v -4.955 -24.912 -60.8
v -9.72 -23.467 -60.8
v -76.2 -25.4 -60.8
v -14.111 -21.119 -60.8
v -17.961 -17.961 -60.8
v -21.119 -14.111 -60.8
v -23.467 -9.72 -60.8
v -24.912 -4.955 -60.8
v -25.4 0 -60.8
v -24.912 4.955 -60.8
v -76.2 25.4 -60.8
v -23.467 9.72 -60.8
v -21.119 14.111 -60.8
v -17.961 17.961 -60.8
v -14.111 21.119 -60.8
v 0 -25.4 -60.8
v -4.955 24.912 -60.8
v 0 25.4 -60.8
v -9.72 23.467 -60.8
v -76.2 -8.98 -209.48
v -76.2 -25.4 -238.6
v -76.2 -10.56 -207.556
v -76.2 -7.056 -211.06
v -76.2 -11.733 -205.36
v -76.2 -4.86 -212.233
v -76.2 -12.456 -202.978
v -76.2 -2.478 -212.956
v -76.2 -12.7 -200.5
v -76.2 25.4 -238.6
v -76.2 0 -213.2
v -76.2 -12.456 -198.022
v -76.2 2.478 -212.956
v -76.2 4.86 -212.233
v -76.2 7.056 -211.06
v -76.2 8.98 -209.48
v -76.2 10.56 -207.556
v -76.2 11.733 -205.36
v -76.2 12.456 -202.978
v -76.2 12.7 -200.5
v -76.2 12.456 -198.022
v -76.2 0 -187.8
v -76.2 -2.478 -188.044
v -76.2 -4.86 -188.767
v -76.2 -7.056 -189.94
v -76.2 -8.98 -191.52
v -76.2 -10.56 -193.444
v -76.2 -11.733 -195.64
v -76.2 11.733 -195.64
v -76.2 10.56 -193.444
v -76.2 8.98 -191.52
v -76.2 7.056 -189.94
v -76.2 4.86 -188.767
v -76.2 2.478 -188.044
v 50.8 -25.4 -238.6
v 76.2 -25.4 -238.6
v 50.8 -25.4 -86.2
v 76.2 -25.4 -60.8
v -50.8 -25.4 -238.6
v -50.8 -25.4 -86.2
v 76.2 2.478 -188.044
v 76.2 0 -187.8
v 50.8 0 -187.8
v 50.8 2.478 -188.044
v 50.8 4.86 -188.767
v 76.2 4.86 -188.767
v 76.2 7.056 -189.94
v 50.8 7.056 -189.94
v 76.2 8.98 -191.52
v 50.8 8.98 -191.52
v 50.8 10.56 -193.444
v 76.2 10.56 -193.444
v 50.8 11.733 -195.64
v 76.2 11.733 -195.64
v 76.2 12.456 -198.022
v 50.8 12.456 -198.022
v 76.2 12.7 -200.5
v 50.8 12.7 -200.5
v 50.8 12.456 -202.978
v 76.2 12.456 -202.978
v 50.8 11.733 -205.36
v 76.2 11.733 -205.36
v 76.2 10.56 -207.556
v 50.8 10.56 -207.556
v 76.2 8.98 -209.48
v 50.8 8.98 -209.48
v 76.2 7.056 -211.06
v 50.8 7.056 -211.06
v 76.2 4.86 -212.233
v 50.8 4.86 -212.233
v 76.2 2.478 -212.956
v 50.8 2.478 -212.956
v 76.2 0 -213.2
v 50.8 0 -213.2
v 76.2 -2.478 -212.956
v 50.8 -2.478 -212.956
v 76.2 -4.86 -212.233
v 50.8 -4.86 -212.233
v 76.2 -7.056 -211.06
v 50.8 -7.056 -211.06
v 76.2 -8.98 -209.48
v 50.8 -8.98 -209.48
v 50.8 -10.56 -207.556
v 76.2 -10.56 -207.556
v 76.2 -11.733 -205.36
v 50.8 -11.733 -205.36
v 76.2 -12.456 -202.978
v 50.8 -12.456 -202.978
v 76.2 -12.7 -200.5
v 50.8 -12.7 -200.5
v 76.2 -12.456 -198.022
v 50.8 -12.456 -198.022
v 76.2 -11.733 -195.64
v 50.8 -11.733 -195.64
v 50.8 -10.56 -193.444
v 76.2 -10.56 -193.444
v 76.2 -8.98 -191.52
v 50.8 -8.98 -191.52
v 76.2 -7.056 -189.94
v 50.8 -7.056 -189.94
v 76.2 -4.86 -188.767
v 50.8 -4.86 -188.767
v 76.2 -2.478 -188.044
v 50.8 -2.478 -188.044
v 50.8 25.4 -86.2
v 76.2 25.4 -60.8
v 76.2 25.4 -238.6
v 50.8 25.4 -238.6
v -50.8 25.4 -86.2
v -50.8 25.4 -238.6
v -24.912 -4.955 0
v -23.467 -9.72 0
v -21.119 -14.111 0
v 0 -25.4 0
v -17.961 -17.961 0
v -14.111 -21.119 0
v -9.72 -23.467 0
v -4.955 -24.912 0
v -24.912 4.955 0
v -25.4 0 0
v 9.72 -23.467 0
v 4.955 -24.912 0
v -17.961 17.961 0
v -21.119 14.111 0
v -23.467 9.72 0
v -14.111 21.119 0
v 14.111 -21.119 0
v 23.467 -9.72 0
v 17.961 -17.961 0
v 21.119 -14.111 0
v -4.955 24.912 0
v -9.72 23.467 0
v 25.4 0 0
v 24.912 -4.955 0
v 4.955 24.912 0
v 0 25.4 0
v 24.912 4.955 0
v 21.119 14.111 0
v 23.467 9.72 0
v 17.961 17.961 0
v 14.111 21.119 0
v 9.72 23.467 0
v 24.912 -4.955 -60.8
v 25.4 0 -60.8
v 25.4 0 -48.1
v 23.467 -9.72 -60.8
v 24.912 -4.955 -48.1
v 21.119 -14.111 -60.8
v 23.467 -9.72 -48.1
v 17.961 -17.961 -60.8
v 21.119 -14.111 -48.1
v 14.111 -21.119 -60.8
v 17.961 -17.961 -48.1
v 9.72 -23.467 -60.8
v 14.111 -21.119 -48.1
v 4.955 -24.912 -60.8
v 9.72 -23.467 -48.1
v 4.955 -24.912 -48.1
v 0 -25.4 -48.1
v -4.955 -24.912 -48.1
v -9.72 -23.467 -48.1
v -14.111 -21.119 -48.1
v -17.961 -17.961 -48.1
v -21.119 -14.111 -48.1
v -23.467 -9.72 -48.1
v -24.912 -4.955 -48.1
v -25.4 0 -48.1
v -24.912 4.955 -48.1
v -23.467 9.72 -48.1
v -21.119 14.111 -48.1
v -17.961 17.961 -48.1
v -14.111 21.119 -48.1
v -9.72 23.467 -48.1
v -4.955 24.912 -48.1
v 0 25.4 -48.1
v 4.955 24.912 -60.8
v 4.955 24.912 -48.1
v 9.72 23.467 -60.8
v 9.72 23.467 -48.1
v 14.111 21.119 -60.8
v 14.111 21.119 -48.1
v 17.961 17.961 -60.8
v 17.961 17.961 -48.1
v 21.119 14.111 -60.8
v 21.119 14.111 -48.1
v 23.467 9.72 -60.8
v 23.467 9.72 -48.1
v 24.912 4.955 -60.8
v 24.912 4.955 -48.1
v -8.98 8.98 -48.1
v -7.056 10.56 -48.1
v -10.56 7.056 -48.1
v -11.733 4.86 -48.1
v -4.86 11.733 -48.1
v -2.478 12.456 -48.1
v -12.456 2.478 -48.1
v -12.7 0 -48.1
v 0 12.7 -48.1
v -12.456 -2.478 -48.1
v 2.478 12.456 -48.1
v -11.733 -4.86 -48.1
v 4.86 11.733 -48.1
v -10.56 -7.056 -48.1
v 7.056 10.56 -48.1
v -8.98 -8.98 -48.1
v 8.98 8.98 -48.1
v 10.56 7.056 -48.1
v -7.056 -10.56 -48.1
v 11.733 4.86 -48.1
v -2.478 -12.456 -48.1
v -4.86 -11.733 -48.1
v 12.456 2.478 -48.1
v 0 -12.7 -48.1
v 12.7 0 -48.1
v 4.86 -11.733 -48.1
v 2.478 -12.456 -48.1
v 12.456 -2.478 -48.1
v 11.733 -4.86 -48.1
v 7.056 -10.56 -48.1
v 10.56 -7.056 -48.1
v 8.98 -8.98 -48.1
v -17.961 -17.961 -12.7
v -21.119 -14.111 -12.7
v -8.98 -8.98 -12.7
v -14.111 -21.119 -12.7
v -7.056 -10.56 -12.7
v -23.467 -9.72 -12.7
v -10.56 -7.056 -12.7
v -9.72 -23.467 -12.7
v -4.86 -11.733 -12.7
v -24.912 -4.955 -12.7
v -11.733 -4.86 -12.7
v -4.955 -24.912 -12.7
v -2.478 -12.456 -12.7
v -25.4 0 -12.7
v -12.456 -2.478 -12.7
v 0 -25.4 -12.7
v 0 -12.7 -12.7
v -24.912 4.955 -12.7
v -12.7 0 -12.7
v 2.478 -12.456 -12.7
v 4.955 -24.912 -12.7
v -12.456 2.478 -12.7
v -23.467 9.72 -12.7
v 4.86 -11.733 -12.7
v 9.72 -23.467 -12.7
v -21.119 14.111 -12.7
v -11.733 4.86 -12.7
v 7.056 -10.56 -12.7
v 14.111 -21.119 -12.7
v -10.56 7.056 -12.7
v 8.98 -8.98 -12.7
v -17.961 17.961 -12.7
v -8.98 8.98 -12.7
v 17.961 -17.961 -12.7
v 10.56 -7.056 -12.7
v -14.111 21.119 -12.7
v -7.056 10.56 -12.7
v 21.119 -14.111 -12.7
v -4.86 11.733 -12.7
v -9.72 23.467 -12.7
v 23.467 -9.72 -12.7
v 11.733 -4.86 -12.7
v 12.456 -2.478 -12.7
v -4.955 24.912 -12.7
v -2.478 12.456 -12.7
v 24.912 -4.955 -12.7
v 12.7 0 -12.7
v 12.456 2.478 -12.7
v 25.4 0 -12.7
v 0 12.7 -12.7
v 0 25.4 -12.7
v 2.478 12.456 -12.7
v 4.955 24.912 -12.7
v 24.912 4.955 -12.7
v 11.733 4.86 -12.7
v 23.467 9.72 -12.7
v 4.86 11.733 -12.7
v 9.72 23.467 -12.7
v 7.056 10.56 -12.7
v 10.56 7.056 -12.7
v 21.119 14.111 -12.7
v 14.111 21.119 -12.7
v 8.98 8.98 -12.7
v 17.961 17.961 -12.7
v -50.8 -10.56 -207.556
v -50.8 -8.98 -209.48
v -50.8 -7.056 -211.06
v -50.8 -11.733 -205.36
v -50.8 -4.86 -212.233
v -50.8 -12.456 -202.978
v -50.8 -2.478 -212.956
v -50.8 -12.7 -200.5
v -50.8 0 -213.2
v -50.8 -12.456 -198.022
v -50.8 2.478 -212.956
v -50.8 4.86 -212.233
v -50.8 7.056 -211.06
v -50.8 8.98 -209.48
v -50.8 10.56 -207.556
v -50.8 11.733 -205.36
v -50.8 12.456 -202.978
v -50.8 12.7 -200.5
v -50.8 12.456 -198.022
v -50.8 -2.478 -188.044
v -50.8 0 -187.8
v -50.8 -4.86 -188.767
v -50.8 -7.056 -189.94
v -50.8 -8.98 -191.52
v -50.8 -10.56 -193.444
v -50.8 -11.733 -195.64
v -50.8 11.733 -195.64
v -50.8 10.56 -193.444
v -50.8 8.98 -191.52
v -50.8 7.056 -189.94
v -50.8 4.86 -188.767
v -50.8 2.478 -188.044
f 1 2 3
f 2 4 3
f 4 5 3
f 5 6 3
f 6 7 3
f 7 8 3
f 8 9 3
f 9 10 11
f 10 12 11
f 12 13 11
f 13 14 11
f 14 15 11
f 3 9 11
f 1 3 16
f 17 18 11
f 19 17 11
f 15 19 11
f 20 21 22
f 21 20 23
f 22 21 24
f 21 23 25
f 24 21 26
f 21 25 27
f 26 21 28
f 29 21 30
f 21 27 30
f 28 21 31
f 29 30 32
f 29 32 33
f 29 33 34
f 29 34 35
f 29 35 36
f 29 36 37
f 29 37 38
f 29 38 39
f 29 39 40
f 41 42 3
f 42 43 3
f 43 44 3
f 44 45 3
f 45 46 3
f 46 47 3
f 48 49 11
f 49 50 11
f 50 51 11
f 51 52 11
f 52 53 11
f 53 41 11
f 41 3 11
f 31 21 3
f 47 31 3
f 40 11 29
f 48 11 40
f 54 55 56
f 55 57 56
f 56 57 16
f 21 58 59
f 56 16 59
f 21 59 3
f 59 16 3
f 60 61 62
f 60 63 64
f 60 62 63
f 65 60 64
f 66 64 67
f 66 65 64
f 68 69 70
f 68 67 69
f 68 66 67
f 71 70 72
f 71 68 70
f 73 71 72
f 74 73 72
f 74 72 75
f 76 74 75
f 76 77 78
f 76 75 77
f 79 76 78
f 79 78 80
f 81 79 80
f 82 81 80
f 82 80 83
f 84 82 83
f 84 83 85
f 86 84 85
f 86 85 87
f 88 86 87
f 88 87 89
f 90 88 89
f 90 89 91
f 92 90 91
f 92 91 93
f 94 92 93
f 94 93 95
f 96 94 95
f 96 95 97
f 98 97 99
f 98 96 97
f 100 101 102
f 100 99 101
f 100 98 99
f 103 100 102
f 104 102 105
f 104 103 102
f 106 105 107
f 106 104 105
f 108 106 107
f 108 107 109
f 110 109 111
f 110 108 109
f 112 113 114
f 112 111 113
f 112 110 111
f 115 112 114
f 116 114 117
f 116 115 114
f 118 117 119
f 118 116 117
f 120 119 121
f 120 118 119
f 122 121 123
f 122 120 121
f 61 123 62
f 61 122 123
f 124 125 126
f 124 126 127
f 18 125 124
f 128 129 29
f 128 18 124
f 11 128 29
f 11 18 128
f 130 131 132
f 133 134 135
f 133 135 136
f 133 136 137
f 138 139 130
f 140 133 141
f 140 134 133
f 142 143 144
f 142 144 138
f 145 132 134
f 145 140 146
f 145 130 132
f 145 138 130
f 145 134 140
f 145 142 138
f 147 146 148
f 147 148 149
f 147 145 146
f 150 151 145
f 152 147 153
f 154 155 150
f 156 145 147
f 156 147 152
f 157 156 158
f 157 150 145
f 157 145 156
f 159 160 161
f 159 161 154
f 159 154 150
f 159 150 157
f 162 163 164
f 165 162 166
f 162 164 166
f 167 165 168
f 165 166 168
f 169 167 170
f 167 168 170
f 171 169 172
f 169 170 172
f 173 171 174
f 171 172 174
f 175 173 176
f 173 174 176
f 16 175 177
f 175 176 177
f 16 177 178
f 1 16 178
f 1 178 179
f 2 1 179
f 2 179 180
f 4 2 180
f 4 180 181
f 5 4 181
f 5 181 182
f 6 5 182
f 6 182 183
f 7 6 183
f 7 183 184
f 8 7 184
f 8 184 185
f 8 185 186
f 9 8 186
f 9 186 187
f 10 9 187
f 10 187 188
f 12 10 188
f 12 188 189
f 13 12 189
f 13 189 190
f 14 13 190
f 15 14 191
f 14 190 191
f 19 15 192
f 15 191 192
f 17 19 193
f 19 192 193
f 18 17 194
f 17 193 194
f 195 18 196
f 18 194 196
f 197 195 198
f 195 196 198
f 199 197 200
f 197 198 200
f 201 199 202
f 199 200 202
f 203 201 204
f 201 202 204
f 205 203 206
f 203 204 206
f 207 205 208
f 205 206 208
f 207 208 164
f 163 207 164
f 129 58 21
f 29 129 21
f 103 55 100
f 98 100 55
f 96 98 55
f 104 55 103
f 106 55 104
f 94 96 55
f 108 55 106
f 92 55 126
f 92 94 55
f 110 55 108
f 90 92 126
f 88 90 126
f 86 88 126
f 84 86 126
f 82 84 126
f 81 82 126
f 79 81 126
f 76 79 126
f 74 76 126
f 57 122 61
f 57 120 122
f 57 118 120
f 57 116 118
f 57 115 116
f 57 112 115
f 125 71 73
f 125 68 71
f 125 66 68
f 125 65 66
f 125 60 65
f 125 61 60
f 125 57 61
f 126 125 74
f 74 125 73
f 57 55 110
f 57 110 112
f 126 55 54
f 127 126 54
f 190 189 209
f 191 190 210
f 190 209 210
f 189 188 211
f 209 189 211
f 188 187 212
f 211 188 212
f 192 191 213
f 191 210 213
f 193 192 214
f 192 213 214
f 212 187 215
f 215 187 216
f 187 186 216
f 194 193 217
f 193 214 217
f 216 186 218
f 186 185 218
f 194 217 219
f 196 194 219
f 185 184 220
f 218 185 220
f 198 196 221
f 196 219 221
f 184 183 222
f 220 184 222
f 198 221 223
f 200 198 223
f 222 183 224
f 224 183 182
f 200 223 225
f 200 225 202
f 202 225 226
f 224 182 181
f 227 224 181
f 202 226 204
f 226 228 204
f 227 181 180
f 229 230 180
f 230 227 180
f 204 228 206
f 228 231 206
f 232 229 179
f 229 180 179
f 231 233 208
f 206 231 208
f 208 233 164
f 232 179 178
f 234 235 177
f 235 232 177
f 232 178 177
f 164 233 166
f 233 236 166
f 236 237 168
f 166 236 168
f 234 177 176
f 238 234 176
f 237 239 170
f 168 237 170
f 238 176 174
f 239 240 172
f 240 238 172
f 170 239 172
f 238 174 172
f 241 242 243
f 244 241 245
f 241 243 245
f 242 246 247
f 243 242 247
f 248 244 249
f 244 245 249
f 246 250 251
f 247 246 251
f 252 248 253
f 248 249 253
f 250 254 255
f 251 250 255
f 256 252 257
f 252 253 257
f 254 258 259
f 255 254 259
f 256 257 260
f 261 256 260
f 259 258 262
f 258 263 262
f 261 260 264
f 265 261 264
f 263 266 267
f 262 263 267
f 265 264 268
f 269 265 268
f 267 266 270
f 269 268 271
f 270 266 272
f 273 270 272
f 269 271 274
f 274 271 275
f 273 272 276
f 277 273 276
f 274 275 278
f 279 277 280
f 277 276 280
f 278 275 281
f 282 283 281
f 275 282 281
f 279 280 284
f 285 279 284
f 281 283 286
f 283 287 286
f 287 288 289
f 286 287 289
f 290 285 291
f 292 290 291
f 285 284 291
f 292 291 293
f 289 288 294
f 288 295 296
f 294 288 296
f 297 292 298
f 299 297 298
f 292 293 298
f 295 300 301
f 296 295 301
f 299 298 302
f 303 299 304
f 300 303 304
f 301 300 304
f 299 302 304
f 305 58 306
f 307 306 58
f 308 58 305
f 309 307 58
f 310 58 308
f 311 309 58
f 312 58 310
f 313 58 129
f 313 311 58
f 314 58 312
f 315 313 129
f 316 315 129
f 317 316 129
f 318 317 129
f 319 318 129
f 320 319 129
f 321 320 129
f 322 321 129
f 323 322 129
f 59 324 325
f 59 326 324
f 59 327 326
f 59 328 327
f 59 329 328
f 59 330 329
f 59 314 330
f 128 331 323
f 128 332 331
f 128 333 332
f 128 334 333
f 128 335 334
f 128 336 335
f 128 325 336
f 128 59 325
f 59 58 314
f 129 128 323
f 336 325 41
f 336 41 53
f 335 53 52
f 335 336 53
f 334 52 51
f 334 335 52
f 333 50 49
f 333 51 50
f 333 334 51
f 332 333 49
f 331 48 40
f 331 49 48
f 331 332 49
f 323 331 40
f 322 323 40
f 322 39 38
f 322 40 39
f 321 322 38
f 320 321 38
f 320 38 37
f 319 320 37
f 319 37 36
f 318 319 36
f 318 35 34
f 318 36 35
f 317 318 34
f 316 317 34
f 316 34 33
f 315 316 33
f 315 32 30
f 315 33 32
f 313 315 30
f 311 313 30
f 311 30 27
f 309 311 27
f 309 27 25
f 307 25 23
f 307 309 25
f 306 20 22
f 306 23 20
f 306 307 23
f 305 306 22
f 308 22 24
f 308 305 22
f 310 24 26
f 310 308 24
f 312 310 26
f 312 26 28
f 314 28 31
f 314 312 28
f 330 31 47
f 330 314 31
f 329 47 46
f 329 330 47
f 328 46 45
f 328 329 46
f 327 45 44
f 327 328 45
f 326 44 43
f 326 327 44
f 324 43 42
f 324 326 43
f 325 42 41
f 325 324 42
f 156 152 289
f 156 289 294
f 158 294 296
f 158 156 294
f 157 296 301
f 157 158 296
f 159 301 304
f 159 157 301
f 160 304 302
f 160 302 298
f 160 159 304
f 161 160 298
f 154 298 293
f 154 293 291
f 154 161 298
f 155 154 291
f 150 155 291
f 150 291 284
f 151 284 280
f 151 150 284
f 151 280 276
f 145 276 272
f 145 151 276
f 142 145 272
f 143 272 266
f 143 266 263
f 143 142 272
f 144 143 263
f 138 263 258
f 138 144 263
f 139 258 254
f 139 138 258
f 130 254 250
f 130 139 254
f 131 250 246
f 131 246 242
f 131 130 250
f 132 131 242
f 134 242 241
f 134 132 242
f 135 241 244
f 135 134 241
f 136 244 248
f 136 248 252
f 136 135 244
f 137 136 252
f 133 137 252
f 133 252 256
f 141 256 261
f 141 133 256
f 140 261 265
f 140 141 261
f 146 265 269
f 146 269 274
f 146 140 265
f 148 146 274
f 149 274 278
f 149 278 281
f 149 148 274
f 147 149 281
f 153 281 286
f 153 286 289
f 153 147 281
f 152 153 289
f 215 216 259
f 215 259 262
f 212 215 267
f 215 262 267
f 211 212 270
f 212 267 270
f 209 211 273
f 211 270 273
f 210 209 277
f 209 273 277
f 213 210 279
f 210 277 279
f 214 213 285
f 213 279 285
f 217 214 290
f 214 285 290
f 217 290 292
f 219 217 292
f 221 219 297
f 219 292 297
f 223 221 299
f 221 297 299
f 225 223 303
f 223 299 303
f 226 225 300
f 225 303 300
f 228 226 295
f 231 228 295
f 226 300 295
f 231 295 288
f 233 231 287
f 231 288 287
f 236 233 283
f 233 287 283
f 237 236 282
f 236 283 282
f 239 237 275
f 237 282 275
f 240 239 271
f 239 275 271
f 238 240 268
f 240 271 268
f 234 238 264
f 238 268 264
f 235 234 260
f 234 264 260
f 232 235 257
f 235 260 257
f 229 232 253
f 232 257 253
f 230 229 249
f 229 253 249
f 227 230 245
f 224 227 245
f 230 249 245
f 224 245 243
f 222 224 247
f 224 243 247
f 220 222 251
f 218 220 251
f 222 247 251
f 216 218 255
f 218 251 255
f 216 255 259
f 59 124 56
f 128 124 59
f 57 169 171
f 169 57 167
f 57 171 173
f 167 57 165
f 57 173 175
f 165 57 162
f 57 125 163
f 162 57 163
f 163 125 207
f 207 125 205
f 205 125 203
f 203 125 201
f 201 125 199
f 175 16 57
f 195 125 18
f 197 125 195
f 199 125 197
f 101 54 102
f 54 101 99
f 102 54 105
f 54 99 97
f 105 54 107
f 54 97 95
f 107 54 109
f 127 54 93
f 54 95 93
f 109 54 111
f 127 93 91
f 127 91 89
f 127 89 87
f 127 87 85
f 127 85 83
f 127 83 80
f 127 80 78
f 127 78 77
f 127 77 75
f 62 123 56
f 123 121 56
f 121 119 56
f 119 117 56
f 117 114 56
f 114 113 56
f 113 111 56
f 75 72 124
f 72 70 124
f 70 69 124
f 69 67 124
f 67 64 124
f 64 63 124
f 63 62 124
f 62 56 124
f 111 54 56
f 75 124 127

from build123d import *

# Parameters (mm, degrees)
SKETCH1_R               = 25.4
BOSS_EXTRUDE1_DEPTH     = 12.7
SKETCH2_R               = 12.7
BOSS_EXTRUDE2_DEPTH     = 35.4
SKETCH3_R               = 25.4
BOSS_EXTRUDE3_DEPTH     = 12.7
SKETCH4_W               = 152.4
SKETCH4_H               = 50.8
BOSS_EXTRUDE4_DEPTH     = 25.4
SKETCH5_W               = 25.4
SKETCH5_H               = 50.8
BOSS_EXTRUDE5_DEPTH     = 152.4
CUT_EXTRUDE1_DEPTH      = 285.254955981
CUT_EXTRUDE1_DEPTH_BACK = 285.254955981
SKETCH6_R               = 12.7


with BuildPart() as part:
    # Sketch1 → Boss-Extrude1 (new body)
    with BuildSketch(Plane.XY):
        Circle(SKETCH1_R)
    extrude(amount=-BOSS_EXTRUDE1_DEPTH)

    # Sketch2 → Boss-Extrude2 (add)
    with BuildSketch(Plane(origin=(0, 0, -12.7), x_dir=(-1, 0, 0), z_dir=(0, 0, -1))):
        Circle(SKETCH2_R)
    extrude(amount=BOSS_EXTRUDE2_DEPTH)

    # Sketch3 → Boss-Extrude3 (add)
    with BuildSketch(Plane(origin=(0, 0, -48.1), x_dir=(-1, 0, 0), z_dir=(0, 0, -1))):
        with Locations(Location((0, 0, 0), (0, 0, 180))):
            Circle(SKETCH3_R)
    extrude(amount=BOSS_EXTRUDE3_DEPTH)

    # Sketch4 → Boss-Extrude4 (add)
    with BuildSketch(Plane(origin=(0, 0, -60.8), x_dir=(-1, 0, 0), z_dir=(0, 0, -1))):
        Rectangle(SKETCH4_W, SKETCH4_H)
    extrude(amount=BOSS_EXTRUDE4_DEPTH)

    # Sketch5 → Boss-Extrude5 (add)
    with BuildSketch(Plane(origin=(0, 0, -86.2), x_dir=(-1, 0, 0), z_dir=(0, 0, -1))):
        with Locations((-63.5, 0)):
            Rectangle(SKETCH5_W, SKETCH5_H)
        with Locations((63.5, 0)):
            Rectangle(SKETCH5_W, SKETCH5_H)
    extrude(amount=BOSS_EXTRUDE5_DEPTH)

    # Sketch6 → Cut-Extrude1 (cut, two sides: drawn at the far end of the back side and taken through both)
    with BuildSketch(Plane.ZY.offset(76.2).offset(-CUT_EXTRUDE1_DEPTH_BACK)):
        with Locations((-200.5, 0)):
            Circle(SKETCH6_R)
    extrude(amount=CUT_EXTRUDE1_DEPTH + CUT_EXTRUDE1_DEPTH_BACK, mode=Mode.SUBTRACT)


solid = part.part
